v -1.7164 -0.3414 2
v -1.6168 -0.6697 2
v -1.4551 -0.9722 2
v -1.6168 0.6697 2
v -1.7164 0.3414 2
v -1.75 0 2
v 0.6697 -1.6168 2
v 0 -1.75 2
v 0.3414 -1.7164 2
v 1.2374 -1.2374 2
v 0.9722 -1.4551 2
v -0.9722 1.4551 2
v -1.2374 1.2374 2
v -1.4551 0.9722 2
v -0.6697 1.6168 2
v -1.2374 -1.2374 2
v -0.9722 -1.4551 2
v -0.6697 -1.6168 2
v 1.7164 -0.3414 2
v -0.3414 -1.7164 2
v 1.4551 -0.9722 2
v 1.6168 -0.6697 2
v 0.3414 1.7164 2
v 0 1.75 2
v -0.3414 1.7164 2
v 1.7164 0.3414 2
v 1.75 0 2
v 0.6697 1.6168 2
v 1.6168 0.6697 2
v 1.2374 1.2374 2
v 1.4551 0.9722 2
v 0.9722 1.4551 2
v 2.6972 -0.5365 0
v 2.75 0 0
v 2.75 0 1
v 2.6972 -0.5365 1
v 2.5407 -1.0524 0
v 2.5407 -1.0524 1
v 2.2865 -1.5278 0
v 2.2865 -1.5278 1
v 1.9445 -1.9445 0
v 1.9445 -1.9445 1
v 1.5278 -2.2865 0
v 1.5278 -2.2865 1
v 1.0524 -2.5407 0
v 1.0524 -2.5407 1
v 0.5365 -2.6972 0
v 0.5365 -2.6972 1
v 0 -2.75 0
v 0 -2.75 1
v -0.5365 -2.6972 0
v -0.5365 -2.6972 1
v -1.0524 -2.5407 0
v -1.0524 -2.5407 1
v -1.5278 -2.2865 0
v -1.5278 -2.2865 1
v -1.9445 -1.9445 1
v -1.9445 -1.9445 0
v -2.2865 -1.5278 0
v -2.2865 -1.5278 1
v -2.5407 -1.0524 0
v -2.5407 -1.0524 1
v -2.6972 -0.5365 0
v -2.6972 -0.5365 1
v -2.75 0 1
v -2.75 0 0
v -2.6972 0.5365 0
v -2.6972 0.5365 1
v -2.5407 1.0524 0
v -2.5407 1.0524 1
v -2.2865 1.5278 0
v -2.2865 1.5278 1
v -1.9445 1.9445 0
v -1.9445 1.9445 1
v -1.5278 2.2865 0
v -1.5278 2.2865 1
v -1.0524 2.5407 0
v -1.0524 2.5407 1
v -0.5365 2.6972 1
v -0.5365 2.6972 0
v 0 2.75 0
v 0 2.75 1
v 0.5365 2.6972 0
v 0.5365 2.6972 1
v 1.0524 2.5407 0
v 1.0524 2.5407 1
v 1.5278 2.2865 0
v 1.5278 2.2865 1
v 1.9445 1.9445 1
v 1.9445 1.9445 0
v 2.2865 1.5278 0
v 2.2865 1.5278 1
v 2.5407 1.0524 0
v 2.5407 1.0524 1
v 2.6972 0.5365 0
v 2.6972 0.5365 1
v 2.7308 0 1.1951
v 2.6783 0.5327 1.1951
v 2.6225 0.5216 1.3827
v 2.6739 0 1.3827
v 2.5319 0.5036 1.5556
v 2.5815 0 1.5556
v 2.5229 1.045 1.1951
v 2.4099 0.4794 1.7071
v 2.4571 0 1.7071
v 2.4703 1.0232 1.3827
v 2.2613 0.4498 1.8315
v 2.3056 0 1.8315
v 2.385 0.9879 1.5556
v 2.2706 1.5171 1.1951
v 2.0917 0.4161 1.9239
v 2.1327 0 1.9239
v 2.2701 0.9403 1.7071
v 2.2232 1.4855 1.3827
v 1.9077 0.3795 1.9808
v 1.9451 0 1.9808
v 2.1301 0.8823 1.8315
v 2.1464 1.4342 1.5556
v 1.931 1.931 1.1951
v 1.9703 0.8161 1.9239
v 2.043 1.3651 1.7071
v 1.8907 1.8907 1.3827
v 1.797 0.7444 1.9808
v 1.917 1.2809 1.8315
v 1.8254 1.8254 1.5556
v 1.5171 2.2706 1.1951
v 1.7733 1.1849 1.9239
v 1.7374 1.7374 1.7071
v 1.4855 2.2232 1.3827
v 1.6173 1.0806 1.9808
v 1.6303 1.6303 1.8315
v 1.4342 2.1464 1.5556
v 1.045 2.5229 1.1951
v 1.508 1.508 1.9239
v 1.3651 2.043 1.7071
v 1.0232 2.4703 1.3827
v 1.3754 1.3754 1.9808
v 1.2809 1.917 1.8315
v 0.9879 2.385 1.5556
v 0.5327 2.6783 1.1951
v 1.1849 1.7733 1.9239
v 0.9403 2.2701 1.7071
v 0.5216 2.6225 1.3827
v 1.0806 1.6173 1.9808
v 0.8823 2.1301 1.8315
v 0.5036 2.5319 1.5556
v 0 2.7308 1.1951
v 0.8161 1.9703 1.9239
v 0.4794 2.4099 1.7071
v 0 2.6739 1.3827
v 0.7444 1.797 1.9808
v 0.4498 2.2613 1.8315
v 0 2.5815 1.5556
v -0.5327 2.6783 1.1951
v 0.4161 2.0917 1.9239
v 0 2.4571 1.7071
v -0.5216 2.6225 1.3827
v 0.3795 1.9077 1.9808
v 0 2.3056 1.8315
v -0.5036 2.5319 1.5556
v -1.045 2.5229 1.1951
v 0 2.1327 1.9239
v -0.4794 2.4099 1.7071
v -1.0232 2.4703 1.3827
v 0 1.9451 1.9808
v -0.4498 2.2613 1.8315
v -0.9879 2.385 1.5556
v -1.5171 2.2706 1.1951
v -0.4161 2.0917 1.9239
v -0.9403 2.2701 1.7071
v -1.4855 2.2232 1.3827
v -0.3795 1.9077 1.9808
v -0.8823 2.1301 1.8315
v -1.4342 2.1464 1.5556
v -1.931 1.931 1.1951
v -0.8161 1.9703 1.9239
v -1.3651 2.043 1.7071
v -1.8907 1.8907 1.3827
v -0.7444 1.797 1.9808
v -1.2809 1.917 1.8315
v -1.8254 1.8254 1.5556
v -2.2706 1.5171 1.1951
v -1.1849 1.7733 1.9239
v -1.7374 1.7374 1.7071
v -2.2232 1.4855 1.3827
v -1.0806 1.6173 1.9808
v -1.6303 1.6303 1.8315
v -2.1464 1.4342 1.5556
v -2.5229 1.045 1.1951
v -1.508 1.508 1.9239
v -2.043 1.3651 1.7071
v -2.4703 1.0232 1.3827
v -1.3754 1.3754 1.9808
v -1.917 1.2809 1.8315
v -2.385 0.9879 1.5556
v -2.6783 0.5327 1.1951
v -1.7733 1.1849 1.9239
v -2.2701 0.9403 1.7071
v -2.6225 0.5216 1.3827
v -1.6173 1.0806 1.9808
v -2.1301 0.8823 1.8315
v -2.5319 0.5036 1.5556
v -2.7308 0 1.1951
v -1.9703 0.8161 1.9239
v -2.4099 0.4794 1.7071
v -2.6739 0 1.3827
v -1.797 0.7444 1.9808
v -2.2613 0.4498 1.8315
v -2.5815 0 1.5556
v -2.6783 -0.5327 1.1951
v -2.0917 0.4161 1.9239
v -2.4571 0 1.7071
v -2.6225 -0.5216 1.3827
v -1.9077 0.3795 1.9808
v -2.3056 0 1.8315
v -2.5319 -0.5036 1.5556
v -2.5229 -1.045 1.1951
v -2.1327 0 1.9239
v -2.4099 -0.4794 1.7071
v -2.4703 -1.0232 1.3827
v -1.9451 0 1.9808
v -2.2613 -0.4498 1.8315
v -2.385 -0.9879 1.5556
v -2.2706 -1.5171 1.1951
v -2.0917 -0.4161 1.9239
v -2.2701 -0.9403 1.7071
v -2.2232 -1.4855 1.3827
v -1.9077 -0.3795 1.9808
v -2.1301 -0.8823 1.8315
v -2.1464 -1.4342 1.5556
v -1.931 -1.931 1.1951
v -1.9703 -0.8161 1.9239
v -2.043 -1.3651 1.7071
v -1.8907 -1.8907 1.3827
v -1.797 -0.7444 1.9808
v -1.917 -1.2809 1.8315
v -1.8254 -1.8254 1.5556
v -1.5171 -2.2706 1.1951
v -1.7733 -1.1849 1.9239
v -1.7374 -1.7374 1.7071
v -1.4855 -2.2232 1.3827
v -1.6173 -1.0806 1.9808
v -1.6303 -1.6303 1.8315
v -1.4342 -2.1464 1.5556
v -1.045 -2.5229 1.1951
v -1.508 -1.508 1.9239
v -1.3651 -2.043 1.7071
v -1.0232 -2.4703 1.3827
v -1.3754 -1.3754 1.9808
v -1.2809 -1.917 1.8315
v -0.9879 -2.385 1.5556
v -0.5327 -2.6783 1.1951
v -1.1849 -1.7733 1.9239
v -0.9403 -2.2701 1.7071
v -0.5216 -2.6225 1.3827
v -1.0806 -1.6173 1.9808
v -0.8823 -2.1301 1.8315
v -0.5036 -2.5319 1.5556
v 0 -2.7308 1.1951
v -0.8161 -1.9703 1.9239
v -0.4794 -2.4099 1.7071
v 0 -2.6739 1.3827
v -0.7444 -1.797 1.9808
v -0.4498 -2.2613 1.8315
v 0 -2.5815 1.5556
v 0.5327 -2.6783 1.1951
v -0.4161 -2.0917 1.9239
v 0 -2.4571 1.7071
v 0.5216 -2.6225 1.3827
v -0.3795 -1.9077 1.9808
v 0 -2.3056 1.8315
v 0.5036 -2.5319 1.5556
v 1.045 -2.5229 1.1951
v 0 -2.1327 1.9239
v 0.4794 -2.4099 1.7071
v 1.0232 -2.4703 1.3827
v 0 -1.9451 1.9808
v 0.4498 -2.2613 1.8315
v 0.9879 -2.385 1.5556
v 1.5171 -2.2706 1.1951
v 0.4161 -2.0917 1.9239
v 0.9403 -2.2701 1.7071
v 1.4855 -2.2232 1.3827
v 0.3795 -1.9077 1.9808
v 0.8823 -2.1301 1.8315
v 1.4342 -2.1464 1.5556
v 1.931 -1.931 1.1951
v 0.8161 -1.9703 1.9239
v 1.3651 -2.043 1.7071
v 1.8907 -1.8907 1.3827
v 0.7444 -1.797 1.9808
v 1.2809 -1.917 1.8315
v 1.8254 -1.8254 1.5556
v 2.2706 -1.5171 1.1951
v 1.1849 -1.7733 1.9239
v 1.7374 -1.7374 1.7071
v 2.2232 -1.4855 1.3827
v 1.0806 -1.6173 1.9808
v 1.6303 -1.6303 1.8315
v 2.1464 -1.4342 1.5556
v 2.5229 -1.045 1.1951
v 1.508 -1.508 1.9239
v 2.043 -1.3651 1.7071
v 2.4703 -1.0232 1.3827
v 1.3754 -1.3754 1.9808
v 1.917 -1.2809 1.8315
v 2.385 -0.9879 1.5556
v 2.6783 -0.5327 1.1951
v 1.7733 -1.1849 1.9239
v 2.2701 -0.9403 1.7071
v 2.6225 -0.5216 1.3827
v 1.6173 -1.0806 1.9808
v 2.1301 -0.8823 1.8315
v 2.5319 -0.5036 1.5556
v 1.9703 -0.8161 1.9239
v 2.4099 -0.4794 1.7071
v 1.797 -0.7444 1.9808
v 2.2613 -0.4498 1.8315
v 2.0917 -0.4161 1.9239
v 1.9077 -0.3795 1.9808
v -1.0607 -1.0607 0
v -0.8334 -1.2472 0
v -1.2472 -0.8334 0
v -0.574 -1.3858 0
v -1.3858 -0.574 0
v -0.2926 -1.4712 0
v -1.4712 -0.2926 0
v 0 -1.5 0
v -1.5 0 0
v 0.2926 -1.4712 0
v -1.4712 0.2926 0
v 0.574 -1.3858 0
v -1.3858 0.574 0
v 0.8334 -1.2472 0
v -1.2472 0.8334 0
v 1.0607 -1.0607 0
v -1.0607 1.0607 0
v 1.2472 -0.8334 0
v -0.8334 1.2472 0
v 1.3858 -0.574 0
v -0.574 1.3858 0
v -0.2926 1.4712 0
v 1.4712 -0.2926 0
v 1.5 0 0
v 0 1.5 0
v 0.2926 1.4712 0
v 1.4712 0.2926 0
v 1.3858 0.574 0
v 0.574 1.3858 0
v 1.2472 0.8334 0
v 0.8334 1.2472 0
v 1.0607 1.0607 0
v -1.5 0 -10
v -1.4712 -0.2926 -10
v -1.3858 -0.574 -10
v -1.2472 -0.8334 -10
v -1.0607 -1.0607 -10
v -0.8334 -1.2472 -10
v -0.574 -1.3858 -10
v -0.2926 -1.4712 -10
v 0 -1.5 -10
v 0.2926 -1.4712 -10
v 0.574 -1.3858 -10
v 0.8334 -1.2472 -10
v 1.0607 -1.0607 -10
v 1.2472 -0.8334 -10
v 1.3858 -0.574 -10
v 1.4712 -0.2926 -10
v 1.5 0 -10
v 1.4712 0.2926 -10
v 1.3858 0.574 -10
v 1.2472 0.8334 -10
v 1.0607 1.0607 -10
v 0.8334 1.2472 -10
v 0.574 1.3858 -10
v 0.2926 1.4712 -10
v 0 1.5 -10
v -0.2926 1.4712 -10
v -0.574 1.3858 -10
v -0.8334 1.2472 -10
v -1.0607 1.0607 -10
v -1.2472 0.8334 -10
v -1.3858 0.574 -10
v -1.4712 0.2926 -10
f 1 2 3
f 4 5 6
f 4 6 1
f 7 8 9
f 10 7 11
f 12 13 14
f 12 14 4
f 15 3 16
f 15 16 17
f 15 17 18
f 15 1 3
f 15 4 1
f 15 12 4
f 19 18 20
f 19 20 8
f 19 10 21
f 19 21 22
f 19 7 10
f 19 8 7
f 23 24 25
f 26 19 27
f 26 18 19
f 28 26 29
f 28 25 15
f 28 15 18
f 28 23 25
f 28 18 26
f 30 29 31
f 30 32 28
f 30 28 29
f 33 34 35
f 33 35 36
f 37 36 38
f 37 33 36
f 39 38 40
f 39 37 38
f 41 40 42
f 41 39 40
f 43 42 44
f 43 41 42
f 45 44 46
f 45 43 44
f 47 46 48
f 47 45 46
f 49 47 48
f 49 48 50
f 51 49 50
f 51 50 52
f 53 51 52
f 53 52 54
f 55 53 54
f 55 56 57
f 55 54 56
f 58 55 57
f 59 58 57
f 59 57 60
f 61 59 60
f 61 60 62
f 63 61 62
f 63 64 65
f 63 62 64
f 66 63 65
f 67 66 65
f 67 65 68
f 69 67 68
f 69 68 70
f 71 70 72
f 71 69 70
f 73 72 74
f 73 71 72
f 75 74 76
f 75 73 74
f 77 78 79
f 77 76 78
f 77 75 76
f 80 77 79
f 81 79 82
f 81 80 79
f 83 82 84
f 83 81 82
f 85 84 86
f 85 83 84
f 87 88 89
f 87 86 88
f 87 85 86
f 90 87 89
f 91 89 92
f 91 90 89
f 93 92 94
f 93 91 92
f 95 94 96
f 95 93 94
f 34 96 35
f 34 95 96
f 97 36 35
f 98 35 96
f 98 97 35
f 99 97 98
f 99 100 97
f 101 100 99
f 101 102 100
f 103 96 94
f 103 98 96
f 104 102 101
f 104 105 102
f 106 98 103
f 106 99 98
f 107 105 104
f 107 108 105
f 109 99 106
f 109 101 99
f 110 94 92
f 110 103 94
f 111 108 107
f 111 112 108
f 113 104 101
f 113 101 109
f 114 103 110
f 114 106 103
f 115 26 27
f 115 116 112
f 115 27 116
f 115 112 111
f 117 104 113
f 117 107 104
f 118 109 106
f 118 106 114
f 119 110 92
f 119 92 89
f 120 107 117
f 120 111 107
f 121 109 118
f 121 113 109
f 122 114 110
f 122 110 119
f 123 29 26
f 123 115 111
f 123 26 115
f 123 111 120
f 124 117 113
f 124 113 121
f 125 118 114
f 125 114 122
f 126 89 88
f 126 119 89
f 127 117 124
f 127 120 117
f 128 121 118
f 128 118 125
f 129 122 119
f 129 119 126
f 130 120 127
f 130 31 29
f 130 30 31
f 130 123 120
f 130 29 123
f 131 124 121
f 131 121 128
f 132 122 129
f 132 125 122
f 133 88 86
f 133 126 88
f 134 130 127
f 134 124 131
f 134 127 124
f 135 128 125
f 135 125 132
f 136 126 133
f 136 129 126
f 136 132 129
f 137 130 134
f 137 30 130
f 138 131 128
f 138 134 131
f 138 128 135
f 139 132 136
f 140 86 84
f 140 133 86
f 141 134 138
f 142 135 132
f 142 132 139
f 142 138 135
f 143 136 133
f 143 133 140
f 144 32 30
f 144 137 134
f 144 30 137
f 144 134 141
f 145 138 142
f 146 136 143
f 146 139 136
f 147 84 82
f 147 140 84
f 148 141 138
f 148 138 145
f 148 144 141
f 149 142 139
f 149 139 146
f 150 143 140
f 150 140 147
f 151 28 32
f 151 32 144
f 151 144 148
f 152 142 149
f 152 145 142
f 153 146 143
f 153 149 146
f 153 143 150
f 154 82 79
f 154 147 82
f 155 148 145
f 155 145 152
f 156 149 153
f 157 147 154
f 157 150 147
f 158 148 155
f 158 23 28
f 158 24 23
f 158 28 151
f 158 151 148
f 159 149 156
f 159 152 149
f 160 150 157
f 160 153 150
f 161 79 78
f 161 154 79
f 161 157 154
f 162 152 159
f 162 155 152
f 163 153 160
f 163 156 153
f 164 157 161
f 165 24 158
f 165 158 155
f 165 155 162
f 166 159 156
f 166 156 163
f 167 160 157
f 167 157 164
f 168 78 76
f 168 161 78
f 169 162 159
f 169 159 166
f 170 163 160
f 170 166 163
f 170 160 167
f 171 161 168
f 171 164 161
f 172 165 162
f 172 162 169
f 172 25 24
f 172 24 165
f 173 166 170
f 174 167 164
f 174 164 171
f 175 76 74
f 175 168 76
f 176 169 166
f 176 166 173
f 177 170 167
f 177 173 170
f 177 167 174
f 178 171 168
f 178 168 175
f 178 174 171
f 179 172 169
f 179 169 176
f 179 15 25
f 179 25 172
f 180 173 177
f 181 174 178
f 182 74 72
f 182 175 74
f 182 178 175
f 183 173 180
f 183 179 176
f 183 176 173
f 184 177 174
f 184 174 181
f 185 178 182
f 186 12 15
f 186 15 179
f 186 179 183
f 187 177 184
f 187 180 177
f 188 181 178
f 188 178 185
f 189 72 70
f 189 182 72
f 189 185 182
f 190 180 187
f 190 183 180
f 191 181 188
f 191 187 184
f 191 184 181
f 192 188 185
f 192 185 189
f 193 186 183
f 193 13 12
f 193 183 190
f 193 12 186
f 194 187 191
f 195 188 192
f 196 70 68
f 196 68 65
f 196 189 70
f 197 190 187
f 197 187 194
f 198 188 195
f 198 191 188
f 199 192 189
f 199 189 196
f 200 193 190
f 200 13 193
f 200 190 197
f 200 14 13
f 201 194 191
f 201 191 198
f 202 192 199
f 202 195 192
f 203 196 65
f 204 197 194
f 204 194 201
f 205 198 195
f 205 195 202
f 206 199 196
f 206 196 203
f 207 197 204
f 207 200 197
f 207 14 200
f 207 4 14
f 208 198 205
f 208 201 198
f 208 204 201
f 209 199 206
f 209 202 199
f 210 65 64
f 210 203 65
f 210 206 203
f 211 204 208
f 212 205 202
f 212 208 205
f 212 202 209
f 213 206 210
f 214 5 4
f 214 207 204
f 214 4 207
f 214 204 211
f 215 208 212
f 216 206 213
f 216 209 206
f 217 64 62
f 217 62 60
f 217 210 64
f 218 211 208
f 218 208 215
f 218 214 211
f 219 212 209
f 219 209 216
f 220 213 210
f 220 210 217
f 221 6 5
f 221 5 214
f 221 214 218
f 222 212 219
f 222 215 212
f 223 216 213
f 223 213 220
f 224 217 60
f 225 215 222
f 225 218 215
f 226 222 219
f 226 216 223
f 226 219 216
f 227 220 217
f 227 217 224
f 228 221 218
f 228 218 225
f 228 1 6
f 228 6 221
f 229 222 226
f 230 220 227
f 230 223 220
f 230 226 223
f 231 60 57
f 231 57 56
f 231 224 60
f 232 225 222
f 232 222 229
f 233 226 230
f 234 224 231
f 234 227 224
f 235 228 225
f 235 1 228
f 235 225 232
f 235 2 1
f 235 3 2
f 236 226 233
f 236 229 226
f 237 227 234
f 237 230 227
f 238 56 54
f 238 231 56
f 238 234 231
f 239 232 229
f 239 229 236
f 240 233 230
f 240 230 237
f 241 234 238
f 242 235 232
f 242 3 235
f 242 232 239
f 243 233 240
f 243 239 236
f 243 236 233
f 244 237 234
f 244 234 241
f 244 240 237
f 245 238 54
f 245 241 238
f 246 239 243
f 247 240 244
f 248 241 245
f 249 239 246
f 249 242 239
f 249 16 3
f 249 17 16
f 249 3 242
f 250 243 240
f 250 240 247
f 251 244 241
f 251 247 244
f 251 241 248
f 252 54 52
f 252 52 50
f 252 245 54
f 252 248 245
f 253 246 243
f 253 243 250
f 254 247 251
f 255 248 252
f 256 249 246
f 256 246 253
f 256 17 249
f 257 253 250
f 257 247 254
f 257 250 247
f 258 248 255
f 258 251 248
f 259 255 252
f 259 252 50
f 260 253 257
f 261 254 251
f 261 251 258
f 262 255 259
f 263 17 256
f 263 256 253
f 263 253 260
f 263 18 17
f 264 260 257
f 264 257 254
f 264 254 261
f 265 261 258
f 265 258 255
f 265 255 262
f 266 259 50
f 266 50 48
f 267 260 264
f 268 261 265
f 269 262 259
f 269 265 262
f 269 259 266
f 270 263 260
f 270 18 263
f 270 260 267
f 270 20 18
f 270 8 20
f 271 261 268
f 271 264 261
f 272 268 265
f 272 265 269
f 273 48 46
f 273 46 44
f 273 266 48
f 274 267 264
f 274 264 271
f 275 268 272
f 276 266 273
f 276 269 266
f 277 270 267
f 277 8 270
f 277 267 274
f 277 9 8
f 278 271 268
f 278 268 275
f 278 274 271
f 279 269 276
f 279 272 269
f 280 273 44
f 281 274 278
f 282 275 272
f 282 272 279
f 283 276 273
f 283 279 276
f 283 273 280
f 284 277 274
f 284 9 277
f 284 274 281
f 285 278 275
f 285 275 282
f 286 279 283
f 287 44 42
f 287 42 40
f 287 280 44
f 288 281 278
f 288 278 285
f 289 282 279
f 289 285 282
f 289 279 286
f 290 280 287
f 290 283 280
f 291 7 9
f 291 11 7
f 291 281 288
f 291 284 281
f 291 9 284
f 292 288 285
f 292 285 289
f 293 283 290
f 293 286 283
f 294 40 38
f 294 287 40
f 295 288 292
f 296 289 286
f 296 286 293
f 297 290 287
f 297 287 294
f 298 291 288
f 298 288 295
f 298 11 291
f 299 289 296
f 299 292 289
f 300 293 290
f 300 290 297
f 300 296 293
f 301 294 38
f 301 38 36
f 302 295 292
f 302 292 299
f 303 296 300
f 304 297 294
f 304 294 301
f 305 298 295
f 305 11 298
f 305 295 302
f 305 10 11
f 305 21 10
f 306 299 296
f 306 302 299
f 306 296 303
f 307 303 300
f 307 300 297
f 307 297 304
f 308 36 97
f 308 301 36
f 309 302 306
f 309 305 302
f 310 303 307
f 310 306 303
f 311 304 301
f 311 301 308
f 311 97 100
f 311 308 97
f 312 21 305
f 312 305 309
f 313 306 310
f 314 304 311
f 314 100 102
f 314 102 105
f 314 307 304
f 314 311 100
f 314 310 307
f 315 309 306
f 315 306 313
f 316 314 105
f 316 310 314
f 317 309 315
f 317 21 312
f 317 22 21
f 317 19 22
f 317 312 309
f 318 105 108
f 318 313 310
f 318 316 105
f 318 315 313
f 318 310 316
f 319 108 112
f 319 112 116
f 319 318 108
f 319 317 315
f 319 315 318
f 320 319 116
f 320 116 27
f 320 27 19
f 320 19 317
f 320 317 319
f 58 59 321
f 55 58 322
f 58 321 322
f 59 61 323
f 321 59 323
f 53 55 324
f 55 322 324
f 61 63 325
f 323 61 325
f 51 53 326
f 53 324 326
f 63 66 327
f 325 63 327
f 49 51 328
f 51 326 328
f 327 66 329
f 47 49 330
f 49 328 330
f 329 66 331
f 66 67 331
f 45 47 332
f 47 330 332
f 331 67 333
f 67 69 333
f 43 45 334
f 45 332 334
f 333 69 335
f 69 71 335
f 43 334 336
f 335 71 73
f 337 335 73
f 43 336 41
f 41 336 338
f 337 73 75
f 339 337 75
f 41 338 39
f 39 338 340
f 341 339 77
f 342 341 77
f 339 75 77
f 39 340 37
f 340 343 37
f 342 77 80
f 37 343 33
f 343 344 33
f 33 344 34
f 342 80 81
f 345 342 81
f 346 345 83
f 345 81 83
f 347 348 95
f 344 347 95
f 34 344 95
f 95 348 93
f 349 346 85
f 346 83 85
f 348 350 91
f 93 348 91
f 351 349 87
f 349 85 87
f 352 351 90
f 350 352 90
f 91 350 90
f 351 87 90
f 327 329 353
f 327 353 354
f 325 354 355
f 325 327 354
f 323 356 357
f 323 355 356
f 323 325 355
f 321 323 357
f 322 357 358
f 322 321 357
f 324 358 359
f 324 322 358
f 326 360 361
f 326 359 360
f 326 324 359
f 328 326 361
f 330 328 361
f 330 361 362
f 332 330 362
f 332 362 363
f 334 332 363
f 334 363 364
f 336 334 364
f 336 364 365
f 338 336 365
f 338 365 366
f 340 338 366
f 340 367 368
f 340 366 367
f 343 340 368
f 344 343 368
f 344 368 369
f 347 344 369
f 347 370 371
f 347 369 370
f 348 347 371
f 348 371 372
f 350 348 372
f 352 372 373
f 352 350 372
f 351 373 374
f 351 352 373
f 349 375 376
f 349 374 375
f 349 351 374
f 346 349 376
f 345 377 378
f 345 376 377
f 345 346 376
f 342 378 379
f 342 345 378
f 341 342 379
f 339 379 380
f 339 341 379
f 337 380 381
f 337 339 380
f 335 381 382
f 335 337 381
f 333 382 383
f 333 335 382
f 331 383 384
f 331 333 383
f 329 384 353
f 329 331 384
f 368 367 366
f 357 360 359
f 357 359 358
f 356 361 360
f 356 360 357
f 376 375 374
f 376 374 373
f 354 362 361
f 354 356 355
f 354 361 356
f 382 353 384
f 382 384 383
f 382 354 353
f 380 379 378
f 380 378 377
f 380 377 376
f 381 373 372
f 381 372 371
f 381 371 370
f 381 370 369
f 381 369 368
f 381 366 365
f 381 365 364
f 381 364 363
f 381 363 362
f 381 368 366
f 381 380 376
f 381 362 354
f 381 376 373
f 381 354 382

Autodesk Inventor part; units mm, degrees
ref_plane "YZ Plane" through (0, 0, 0) normal (1, 0, 0) x (0, 1, 0)
ref_plane "XZ Plane" through (0, 0, 0) normal (0, 1, 0) x (-1, 0, 0)
ref_plane "XY Plane" through (0, 0, 0) normal (0, 0, 1) x (1, 0, 0)
sketch "スケッチ1" plane through (0, 0, 0) normal (0, 0, 1) x (1, 0, 0)
  circle A0 centre (0, 0) radius 2.75
  dimension "d0" = 5.5
extrude "押し出し1" add sketch "スケッチ1" along normal blind 2
fillet "フィレット1" radius 1 1 edges at (-2.75, 0, 2)
sketch "スケッチ2" plane through (0, 0, 0) normal (0, 0, -1) x (-1, 0, 0)
  circle A0 centre (0, 0) radius 1.5
  dimension "d4" = 3
extrude "押し出し2" add sketch "スケッチ2" along normal blind 10
thread "ねじ1" size "M3x0.5" class "6g" standard "ANSI Metric M Profile" full length
properties part number "Screw_10mm" material "真鍮"
